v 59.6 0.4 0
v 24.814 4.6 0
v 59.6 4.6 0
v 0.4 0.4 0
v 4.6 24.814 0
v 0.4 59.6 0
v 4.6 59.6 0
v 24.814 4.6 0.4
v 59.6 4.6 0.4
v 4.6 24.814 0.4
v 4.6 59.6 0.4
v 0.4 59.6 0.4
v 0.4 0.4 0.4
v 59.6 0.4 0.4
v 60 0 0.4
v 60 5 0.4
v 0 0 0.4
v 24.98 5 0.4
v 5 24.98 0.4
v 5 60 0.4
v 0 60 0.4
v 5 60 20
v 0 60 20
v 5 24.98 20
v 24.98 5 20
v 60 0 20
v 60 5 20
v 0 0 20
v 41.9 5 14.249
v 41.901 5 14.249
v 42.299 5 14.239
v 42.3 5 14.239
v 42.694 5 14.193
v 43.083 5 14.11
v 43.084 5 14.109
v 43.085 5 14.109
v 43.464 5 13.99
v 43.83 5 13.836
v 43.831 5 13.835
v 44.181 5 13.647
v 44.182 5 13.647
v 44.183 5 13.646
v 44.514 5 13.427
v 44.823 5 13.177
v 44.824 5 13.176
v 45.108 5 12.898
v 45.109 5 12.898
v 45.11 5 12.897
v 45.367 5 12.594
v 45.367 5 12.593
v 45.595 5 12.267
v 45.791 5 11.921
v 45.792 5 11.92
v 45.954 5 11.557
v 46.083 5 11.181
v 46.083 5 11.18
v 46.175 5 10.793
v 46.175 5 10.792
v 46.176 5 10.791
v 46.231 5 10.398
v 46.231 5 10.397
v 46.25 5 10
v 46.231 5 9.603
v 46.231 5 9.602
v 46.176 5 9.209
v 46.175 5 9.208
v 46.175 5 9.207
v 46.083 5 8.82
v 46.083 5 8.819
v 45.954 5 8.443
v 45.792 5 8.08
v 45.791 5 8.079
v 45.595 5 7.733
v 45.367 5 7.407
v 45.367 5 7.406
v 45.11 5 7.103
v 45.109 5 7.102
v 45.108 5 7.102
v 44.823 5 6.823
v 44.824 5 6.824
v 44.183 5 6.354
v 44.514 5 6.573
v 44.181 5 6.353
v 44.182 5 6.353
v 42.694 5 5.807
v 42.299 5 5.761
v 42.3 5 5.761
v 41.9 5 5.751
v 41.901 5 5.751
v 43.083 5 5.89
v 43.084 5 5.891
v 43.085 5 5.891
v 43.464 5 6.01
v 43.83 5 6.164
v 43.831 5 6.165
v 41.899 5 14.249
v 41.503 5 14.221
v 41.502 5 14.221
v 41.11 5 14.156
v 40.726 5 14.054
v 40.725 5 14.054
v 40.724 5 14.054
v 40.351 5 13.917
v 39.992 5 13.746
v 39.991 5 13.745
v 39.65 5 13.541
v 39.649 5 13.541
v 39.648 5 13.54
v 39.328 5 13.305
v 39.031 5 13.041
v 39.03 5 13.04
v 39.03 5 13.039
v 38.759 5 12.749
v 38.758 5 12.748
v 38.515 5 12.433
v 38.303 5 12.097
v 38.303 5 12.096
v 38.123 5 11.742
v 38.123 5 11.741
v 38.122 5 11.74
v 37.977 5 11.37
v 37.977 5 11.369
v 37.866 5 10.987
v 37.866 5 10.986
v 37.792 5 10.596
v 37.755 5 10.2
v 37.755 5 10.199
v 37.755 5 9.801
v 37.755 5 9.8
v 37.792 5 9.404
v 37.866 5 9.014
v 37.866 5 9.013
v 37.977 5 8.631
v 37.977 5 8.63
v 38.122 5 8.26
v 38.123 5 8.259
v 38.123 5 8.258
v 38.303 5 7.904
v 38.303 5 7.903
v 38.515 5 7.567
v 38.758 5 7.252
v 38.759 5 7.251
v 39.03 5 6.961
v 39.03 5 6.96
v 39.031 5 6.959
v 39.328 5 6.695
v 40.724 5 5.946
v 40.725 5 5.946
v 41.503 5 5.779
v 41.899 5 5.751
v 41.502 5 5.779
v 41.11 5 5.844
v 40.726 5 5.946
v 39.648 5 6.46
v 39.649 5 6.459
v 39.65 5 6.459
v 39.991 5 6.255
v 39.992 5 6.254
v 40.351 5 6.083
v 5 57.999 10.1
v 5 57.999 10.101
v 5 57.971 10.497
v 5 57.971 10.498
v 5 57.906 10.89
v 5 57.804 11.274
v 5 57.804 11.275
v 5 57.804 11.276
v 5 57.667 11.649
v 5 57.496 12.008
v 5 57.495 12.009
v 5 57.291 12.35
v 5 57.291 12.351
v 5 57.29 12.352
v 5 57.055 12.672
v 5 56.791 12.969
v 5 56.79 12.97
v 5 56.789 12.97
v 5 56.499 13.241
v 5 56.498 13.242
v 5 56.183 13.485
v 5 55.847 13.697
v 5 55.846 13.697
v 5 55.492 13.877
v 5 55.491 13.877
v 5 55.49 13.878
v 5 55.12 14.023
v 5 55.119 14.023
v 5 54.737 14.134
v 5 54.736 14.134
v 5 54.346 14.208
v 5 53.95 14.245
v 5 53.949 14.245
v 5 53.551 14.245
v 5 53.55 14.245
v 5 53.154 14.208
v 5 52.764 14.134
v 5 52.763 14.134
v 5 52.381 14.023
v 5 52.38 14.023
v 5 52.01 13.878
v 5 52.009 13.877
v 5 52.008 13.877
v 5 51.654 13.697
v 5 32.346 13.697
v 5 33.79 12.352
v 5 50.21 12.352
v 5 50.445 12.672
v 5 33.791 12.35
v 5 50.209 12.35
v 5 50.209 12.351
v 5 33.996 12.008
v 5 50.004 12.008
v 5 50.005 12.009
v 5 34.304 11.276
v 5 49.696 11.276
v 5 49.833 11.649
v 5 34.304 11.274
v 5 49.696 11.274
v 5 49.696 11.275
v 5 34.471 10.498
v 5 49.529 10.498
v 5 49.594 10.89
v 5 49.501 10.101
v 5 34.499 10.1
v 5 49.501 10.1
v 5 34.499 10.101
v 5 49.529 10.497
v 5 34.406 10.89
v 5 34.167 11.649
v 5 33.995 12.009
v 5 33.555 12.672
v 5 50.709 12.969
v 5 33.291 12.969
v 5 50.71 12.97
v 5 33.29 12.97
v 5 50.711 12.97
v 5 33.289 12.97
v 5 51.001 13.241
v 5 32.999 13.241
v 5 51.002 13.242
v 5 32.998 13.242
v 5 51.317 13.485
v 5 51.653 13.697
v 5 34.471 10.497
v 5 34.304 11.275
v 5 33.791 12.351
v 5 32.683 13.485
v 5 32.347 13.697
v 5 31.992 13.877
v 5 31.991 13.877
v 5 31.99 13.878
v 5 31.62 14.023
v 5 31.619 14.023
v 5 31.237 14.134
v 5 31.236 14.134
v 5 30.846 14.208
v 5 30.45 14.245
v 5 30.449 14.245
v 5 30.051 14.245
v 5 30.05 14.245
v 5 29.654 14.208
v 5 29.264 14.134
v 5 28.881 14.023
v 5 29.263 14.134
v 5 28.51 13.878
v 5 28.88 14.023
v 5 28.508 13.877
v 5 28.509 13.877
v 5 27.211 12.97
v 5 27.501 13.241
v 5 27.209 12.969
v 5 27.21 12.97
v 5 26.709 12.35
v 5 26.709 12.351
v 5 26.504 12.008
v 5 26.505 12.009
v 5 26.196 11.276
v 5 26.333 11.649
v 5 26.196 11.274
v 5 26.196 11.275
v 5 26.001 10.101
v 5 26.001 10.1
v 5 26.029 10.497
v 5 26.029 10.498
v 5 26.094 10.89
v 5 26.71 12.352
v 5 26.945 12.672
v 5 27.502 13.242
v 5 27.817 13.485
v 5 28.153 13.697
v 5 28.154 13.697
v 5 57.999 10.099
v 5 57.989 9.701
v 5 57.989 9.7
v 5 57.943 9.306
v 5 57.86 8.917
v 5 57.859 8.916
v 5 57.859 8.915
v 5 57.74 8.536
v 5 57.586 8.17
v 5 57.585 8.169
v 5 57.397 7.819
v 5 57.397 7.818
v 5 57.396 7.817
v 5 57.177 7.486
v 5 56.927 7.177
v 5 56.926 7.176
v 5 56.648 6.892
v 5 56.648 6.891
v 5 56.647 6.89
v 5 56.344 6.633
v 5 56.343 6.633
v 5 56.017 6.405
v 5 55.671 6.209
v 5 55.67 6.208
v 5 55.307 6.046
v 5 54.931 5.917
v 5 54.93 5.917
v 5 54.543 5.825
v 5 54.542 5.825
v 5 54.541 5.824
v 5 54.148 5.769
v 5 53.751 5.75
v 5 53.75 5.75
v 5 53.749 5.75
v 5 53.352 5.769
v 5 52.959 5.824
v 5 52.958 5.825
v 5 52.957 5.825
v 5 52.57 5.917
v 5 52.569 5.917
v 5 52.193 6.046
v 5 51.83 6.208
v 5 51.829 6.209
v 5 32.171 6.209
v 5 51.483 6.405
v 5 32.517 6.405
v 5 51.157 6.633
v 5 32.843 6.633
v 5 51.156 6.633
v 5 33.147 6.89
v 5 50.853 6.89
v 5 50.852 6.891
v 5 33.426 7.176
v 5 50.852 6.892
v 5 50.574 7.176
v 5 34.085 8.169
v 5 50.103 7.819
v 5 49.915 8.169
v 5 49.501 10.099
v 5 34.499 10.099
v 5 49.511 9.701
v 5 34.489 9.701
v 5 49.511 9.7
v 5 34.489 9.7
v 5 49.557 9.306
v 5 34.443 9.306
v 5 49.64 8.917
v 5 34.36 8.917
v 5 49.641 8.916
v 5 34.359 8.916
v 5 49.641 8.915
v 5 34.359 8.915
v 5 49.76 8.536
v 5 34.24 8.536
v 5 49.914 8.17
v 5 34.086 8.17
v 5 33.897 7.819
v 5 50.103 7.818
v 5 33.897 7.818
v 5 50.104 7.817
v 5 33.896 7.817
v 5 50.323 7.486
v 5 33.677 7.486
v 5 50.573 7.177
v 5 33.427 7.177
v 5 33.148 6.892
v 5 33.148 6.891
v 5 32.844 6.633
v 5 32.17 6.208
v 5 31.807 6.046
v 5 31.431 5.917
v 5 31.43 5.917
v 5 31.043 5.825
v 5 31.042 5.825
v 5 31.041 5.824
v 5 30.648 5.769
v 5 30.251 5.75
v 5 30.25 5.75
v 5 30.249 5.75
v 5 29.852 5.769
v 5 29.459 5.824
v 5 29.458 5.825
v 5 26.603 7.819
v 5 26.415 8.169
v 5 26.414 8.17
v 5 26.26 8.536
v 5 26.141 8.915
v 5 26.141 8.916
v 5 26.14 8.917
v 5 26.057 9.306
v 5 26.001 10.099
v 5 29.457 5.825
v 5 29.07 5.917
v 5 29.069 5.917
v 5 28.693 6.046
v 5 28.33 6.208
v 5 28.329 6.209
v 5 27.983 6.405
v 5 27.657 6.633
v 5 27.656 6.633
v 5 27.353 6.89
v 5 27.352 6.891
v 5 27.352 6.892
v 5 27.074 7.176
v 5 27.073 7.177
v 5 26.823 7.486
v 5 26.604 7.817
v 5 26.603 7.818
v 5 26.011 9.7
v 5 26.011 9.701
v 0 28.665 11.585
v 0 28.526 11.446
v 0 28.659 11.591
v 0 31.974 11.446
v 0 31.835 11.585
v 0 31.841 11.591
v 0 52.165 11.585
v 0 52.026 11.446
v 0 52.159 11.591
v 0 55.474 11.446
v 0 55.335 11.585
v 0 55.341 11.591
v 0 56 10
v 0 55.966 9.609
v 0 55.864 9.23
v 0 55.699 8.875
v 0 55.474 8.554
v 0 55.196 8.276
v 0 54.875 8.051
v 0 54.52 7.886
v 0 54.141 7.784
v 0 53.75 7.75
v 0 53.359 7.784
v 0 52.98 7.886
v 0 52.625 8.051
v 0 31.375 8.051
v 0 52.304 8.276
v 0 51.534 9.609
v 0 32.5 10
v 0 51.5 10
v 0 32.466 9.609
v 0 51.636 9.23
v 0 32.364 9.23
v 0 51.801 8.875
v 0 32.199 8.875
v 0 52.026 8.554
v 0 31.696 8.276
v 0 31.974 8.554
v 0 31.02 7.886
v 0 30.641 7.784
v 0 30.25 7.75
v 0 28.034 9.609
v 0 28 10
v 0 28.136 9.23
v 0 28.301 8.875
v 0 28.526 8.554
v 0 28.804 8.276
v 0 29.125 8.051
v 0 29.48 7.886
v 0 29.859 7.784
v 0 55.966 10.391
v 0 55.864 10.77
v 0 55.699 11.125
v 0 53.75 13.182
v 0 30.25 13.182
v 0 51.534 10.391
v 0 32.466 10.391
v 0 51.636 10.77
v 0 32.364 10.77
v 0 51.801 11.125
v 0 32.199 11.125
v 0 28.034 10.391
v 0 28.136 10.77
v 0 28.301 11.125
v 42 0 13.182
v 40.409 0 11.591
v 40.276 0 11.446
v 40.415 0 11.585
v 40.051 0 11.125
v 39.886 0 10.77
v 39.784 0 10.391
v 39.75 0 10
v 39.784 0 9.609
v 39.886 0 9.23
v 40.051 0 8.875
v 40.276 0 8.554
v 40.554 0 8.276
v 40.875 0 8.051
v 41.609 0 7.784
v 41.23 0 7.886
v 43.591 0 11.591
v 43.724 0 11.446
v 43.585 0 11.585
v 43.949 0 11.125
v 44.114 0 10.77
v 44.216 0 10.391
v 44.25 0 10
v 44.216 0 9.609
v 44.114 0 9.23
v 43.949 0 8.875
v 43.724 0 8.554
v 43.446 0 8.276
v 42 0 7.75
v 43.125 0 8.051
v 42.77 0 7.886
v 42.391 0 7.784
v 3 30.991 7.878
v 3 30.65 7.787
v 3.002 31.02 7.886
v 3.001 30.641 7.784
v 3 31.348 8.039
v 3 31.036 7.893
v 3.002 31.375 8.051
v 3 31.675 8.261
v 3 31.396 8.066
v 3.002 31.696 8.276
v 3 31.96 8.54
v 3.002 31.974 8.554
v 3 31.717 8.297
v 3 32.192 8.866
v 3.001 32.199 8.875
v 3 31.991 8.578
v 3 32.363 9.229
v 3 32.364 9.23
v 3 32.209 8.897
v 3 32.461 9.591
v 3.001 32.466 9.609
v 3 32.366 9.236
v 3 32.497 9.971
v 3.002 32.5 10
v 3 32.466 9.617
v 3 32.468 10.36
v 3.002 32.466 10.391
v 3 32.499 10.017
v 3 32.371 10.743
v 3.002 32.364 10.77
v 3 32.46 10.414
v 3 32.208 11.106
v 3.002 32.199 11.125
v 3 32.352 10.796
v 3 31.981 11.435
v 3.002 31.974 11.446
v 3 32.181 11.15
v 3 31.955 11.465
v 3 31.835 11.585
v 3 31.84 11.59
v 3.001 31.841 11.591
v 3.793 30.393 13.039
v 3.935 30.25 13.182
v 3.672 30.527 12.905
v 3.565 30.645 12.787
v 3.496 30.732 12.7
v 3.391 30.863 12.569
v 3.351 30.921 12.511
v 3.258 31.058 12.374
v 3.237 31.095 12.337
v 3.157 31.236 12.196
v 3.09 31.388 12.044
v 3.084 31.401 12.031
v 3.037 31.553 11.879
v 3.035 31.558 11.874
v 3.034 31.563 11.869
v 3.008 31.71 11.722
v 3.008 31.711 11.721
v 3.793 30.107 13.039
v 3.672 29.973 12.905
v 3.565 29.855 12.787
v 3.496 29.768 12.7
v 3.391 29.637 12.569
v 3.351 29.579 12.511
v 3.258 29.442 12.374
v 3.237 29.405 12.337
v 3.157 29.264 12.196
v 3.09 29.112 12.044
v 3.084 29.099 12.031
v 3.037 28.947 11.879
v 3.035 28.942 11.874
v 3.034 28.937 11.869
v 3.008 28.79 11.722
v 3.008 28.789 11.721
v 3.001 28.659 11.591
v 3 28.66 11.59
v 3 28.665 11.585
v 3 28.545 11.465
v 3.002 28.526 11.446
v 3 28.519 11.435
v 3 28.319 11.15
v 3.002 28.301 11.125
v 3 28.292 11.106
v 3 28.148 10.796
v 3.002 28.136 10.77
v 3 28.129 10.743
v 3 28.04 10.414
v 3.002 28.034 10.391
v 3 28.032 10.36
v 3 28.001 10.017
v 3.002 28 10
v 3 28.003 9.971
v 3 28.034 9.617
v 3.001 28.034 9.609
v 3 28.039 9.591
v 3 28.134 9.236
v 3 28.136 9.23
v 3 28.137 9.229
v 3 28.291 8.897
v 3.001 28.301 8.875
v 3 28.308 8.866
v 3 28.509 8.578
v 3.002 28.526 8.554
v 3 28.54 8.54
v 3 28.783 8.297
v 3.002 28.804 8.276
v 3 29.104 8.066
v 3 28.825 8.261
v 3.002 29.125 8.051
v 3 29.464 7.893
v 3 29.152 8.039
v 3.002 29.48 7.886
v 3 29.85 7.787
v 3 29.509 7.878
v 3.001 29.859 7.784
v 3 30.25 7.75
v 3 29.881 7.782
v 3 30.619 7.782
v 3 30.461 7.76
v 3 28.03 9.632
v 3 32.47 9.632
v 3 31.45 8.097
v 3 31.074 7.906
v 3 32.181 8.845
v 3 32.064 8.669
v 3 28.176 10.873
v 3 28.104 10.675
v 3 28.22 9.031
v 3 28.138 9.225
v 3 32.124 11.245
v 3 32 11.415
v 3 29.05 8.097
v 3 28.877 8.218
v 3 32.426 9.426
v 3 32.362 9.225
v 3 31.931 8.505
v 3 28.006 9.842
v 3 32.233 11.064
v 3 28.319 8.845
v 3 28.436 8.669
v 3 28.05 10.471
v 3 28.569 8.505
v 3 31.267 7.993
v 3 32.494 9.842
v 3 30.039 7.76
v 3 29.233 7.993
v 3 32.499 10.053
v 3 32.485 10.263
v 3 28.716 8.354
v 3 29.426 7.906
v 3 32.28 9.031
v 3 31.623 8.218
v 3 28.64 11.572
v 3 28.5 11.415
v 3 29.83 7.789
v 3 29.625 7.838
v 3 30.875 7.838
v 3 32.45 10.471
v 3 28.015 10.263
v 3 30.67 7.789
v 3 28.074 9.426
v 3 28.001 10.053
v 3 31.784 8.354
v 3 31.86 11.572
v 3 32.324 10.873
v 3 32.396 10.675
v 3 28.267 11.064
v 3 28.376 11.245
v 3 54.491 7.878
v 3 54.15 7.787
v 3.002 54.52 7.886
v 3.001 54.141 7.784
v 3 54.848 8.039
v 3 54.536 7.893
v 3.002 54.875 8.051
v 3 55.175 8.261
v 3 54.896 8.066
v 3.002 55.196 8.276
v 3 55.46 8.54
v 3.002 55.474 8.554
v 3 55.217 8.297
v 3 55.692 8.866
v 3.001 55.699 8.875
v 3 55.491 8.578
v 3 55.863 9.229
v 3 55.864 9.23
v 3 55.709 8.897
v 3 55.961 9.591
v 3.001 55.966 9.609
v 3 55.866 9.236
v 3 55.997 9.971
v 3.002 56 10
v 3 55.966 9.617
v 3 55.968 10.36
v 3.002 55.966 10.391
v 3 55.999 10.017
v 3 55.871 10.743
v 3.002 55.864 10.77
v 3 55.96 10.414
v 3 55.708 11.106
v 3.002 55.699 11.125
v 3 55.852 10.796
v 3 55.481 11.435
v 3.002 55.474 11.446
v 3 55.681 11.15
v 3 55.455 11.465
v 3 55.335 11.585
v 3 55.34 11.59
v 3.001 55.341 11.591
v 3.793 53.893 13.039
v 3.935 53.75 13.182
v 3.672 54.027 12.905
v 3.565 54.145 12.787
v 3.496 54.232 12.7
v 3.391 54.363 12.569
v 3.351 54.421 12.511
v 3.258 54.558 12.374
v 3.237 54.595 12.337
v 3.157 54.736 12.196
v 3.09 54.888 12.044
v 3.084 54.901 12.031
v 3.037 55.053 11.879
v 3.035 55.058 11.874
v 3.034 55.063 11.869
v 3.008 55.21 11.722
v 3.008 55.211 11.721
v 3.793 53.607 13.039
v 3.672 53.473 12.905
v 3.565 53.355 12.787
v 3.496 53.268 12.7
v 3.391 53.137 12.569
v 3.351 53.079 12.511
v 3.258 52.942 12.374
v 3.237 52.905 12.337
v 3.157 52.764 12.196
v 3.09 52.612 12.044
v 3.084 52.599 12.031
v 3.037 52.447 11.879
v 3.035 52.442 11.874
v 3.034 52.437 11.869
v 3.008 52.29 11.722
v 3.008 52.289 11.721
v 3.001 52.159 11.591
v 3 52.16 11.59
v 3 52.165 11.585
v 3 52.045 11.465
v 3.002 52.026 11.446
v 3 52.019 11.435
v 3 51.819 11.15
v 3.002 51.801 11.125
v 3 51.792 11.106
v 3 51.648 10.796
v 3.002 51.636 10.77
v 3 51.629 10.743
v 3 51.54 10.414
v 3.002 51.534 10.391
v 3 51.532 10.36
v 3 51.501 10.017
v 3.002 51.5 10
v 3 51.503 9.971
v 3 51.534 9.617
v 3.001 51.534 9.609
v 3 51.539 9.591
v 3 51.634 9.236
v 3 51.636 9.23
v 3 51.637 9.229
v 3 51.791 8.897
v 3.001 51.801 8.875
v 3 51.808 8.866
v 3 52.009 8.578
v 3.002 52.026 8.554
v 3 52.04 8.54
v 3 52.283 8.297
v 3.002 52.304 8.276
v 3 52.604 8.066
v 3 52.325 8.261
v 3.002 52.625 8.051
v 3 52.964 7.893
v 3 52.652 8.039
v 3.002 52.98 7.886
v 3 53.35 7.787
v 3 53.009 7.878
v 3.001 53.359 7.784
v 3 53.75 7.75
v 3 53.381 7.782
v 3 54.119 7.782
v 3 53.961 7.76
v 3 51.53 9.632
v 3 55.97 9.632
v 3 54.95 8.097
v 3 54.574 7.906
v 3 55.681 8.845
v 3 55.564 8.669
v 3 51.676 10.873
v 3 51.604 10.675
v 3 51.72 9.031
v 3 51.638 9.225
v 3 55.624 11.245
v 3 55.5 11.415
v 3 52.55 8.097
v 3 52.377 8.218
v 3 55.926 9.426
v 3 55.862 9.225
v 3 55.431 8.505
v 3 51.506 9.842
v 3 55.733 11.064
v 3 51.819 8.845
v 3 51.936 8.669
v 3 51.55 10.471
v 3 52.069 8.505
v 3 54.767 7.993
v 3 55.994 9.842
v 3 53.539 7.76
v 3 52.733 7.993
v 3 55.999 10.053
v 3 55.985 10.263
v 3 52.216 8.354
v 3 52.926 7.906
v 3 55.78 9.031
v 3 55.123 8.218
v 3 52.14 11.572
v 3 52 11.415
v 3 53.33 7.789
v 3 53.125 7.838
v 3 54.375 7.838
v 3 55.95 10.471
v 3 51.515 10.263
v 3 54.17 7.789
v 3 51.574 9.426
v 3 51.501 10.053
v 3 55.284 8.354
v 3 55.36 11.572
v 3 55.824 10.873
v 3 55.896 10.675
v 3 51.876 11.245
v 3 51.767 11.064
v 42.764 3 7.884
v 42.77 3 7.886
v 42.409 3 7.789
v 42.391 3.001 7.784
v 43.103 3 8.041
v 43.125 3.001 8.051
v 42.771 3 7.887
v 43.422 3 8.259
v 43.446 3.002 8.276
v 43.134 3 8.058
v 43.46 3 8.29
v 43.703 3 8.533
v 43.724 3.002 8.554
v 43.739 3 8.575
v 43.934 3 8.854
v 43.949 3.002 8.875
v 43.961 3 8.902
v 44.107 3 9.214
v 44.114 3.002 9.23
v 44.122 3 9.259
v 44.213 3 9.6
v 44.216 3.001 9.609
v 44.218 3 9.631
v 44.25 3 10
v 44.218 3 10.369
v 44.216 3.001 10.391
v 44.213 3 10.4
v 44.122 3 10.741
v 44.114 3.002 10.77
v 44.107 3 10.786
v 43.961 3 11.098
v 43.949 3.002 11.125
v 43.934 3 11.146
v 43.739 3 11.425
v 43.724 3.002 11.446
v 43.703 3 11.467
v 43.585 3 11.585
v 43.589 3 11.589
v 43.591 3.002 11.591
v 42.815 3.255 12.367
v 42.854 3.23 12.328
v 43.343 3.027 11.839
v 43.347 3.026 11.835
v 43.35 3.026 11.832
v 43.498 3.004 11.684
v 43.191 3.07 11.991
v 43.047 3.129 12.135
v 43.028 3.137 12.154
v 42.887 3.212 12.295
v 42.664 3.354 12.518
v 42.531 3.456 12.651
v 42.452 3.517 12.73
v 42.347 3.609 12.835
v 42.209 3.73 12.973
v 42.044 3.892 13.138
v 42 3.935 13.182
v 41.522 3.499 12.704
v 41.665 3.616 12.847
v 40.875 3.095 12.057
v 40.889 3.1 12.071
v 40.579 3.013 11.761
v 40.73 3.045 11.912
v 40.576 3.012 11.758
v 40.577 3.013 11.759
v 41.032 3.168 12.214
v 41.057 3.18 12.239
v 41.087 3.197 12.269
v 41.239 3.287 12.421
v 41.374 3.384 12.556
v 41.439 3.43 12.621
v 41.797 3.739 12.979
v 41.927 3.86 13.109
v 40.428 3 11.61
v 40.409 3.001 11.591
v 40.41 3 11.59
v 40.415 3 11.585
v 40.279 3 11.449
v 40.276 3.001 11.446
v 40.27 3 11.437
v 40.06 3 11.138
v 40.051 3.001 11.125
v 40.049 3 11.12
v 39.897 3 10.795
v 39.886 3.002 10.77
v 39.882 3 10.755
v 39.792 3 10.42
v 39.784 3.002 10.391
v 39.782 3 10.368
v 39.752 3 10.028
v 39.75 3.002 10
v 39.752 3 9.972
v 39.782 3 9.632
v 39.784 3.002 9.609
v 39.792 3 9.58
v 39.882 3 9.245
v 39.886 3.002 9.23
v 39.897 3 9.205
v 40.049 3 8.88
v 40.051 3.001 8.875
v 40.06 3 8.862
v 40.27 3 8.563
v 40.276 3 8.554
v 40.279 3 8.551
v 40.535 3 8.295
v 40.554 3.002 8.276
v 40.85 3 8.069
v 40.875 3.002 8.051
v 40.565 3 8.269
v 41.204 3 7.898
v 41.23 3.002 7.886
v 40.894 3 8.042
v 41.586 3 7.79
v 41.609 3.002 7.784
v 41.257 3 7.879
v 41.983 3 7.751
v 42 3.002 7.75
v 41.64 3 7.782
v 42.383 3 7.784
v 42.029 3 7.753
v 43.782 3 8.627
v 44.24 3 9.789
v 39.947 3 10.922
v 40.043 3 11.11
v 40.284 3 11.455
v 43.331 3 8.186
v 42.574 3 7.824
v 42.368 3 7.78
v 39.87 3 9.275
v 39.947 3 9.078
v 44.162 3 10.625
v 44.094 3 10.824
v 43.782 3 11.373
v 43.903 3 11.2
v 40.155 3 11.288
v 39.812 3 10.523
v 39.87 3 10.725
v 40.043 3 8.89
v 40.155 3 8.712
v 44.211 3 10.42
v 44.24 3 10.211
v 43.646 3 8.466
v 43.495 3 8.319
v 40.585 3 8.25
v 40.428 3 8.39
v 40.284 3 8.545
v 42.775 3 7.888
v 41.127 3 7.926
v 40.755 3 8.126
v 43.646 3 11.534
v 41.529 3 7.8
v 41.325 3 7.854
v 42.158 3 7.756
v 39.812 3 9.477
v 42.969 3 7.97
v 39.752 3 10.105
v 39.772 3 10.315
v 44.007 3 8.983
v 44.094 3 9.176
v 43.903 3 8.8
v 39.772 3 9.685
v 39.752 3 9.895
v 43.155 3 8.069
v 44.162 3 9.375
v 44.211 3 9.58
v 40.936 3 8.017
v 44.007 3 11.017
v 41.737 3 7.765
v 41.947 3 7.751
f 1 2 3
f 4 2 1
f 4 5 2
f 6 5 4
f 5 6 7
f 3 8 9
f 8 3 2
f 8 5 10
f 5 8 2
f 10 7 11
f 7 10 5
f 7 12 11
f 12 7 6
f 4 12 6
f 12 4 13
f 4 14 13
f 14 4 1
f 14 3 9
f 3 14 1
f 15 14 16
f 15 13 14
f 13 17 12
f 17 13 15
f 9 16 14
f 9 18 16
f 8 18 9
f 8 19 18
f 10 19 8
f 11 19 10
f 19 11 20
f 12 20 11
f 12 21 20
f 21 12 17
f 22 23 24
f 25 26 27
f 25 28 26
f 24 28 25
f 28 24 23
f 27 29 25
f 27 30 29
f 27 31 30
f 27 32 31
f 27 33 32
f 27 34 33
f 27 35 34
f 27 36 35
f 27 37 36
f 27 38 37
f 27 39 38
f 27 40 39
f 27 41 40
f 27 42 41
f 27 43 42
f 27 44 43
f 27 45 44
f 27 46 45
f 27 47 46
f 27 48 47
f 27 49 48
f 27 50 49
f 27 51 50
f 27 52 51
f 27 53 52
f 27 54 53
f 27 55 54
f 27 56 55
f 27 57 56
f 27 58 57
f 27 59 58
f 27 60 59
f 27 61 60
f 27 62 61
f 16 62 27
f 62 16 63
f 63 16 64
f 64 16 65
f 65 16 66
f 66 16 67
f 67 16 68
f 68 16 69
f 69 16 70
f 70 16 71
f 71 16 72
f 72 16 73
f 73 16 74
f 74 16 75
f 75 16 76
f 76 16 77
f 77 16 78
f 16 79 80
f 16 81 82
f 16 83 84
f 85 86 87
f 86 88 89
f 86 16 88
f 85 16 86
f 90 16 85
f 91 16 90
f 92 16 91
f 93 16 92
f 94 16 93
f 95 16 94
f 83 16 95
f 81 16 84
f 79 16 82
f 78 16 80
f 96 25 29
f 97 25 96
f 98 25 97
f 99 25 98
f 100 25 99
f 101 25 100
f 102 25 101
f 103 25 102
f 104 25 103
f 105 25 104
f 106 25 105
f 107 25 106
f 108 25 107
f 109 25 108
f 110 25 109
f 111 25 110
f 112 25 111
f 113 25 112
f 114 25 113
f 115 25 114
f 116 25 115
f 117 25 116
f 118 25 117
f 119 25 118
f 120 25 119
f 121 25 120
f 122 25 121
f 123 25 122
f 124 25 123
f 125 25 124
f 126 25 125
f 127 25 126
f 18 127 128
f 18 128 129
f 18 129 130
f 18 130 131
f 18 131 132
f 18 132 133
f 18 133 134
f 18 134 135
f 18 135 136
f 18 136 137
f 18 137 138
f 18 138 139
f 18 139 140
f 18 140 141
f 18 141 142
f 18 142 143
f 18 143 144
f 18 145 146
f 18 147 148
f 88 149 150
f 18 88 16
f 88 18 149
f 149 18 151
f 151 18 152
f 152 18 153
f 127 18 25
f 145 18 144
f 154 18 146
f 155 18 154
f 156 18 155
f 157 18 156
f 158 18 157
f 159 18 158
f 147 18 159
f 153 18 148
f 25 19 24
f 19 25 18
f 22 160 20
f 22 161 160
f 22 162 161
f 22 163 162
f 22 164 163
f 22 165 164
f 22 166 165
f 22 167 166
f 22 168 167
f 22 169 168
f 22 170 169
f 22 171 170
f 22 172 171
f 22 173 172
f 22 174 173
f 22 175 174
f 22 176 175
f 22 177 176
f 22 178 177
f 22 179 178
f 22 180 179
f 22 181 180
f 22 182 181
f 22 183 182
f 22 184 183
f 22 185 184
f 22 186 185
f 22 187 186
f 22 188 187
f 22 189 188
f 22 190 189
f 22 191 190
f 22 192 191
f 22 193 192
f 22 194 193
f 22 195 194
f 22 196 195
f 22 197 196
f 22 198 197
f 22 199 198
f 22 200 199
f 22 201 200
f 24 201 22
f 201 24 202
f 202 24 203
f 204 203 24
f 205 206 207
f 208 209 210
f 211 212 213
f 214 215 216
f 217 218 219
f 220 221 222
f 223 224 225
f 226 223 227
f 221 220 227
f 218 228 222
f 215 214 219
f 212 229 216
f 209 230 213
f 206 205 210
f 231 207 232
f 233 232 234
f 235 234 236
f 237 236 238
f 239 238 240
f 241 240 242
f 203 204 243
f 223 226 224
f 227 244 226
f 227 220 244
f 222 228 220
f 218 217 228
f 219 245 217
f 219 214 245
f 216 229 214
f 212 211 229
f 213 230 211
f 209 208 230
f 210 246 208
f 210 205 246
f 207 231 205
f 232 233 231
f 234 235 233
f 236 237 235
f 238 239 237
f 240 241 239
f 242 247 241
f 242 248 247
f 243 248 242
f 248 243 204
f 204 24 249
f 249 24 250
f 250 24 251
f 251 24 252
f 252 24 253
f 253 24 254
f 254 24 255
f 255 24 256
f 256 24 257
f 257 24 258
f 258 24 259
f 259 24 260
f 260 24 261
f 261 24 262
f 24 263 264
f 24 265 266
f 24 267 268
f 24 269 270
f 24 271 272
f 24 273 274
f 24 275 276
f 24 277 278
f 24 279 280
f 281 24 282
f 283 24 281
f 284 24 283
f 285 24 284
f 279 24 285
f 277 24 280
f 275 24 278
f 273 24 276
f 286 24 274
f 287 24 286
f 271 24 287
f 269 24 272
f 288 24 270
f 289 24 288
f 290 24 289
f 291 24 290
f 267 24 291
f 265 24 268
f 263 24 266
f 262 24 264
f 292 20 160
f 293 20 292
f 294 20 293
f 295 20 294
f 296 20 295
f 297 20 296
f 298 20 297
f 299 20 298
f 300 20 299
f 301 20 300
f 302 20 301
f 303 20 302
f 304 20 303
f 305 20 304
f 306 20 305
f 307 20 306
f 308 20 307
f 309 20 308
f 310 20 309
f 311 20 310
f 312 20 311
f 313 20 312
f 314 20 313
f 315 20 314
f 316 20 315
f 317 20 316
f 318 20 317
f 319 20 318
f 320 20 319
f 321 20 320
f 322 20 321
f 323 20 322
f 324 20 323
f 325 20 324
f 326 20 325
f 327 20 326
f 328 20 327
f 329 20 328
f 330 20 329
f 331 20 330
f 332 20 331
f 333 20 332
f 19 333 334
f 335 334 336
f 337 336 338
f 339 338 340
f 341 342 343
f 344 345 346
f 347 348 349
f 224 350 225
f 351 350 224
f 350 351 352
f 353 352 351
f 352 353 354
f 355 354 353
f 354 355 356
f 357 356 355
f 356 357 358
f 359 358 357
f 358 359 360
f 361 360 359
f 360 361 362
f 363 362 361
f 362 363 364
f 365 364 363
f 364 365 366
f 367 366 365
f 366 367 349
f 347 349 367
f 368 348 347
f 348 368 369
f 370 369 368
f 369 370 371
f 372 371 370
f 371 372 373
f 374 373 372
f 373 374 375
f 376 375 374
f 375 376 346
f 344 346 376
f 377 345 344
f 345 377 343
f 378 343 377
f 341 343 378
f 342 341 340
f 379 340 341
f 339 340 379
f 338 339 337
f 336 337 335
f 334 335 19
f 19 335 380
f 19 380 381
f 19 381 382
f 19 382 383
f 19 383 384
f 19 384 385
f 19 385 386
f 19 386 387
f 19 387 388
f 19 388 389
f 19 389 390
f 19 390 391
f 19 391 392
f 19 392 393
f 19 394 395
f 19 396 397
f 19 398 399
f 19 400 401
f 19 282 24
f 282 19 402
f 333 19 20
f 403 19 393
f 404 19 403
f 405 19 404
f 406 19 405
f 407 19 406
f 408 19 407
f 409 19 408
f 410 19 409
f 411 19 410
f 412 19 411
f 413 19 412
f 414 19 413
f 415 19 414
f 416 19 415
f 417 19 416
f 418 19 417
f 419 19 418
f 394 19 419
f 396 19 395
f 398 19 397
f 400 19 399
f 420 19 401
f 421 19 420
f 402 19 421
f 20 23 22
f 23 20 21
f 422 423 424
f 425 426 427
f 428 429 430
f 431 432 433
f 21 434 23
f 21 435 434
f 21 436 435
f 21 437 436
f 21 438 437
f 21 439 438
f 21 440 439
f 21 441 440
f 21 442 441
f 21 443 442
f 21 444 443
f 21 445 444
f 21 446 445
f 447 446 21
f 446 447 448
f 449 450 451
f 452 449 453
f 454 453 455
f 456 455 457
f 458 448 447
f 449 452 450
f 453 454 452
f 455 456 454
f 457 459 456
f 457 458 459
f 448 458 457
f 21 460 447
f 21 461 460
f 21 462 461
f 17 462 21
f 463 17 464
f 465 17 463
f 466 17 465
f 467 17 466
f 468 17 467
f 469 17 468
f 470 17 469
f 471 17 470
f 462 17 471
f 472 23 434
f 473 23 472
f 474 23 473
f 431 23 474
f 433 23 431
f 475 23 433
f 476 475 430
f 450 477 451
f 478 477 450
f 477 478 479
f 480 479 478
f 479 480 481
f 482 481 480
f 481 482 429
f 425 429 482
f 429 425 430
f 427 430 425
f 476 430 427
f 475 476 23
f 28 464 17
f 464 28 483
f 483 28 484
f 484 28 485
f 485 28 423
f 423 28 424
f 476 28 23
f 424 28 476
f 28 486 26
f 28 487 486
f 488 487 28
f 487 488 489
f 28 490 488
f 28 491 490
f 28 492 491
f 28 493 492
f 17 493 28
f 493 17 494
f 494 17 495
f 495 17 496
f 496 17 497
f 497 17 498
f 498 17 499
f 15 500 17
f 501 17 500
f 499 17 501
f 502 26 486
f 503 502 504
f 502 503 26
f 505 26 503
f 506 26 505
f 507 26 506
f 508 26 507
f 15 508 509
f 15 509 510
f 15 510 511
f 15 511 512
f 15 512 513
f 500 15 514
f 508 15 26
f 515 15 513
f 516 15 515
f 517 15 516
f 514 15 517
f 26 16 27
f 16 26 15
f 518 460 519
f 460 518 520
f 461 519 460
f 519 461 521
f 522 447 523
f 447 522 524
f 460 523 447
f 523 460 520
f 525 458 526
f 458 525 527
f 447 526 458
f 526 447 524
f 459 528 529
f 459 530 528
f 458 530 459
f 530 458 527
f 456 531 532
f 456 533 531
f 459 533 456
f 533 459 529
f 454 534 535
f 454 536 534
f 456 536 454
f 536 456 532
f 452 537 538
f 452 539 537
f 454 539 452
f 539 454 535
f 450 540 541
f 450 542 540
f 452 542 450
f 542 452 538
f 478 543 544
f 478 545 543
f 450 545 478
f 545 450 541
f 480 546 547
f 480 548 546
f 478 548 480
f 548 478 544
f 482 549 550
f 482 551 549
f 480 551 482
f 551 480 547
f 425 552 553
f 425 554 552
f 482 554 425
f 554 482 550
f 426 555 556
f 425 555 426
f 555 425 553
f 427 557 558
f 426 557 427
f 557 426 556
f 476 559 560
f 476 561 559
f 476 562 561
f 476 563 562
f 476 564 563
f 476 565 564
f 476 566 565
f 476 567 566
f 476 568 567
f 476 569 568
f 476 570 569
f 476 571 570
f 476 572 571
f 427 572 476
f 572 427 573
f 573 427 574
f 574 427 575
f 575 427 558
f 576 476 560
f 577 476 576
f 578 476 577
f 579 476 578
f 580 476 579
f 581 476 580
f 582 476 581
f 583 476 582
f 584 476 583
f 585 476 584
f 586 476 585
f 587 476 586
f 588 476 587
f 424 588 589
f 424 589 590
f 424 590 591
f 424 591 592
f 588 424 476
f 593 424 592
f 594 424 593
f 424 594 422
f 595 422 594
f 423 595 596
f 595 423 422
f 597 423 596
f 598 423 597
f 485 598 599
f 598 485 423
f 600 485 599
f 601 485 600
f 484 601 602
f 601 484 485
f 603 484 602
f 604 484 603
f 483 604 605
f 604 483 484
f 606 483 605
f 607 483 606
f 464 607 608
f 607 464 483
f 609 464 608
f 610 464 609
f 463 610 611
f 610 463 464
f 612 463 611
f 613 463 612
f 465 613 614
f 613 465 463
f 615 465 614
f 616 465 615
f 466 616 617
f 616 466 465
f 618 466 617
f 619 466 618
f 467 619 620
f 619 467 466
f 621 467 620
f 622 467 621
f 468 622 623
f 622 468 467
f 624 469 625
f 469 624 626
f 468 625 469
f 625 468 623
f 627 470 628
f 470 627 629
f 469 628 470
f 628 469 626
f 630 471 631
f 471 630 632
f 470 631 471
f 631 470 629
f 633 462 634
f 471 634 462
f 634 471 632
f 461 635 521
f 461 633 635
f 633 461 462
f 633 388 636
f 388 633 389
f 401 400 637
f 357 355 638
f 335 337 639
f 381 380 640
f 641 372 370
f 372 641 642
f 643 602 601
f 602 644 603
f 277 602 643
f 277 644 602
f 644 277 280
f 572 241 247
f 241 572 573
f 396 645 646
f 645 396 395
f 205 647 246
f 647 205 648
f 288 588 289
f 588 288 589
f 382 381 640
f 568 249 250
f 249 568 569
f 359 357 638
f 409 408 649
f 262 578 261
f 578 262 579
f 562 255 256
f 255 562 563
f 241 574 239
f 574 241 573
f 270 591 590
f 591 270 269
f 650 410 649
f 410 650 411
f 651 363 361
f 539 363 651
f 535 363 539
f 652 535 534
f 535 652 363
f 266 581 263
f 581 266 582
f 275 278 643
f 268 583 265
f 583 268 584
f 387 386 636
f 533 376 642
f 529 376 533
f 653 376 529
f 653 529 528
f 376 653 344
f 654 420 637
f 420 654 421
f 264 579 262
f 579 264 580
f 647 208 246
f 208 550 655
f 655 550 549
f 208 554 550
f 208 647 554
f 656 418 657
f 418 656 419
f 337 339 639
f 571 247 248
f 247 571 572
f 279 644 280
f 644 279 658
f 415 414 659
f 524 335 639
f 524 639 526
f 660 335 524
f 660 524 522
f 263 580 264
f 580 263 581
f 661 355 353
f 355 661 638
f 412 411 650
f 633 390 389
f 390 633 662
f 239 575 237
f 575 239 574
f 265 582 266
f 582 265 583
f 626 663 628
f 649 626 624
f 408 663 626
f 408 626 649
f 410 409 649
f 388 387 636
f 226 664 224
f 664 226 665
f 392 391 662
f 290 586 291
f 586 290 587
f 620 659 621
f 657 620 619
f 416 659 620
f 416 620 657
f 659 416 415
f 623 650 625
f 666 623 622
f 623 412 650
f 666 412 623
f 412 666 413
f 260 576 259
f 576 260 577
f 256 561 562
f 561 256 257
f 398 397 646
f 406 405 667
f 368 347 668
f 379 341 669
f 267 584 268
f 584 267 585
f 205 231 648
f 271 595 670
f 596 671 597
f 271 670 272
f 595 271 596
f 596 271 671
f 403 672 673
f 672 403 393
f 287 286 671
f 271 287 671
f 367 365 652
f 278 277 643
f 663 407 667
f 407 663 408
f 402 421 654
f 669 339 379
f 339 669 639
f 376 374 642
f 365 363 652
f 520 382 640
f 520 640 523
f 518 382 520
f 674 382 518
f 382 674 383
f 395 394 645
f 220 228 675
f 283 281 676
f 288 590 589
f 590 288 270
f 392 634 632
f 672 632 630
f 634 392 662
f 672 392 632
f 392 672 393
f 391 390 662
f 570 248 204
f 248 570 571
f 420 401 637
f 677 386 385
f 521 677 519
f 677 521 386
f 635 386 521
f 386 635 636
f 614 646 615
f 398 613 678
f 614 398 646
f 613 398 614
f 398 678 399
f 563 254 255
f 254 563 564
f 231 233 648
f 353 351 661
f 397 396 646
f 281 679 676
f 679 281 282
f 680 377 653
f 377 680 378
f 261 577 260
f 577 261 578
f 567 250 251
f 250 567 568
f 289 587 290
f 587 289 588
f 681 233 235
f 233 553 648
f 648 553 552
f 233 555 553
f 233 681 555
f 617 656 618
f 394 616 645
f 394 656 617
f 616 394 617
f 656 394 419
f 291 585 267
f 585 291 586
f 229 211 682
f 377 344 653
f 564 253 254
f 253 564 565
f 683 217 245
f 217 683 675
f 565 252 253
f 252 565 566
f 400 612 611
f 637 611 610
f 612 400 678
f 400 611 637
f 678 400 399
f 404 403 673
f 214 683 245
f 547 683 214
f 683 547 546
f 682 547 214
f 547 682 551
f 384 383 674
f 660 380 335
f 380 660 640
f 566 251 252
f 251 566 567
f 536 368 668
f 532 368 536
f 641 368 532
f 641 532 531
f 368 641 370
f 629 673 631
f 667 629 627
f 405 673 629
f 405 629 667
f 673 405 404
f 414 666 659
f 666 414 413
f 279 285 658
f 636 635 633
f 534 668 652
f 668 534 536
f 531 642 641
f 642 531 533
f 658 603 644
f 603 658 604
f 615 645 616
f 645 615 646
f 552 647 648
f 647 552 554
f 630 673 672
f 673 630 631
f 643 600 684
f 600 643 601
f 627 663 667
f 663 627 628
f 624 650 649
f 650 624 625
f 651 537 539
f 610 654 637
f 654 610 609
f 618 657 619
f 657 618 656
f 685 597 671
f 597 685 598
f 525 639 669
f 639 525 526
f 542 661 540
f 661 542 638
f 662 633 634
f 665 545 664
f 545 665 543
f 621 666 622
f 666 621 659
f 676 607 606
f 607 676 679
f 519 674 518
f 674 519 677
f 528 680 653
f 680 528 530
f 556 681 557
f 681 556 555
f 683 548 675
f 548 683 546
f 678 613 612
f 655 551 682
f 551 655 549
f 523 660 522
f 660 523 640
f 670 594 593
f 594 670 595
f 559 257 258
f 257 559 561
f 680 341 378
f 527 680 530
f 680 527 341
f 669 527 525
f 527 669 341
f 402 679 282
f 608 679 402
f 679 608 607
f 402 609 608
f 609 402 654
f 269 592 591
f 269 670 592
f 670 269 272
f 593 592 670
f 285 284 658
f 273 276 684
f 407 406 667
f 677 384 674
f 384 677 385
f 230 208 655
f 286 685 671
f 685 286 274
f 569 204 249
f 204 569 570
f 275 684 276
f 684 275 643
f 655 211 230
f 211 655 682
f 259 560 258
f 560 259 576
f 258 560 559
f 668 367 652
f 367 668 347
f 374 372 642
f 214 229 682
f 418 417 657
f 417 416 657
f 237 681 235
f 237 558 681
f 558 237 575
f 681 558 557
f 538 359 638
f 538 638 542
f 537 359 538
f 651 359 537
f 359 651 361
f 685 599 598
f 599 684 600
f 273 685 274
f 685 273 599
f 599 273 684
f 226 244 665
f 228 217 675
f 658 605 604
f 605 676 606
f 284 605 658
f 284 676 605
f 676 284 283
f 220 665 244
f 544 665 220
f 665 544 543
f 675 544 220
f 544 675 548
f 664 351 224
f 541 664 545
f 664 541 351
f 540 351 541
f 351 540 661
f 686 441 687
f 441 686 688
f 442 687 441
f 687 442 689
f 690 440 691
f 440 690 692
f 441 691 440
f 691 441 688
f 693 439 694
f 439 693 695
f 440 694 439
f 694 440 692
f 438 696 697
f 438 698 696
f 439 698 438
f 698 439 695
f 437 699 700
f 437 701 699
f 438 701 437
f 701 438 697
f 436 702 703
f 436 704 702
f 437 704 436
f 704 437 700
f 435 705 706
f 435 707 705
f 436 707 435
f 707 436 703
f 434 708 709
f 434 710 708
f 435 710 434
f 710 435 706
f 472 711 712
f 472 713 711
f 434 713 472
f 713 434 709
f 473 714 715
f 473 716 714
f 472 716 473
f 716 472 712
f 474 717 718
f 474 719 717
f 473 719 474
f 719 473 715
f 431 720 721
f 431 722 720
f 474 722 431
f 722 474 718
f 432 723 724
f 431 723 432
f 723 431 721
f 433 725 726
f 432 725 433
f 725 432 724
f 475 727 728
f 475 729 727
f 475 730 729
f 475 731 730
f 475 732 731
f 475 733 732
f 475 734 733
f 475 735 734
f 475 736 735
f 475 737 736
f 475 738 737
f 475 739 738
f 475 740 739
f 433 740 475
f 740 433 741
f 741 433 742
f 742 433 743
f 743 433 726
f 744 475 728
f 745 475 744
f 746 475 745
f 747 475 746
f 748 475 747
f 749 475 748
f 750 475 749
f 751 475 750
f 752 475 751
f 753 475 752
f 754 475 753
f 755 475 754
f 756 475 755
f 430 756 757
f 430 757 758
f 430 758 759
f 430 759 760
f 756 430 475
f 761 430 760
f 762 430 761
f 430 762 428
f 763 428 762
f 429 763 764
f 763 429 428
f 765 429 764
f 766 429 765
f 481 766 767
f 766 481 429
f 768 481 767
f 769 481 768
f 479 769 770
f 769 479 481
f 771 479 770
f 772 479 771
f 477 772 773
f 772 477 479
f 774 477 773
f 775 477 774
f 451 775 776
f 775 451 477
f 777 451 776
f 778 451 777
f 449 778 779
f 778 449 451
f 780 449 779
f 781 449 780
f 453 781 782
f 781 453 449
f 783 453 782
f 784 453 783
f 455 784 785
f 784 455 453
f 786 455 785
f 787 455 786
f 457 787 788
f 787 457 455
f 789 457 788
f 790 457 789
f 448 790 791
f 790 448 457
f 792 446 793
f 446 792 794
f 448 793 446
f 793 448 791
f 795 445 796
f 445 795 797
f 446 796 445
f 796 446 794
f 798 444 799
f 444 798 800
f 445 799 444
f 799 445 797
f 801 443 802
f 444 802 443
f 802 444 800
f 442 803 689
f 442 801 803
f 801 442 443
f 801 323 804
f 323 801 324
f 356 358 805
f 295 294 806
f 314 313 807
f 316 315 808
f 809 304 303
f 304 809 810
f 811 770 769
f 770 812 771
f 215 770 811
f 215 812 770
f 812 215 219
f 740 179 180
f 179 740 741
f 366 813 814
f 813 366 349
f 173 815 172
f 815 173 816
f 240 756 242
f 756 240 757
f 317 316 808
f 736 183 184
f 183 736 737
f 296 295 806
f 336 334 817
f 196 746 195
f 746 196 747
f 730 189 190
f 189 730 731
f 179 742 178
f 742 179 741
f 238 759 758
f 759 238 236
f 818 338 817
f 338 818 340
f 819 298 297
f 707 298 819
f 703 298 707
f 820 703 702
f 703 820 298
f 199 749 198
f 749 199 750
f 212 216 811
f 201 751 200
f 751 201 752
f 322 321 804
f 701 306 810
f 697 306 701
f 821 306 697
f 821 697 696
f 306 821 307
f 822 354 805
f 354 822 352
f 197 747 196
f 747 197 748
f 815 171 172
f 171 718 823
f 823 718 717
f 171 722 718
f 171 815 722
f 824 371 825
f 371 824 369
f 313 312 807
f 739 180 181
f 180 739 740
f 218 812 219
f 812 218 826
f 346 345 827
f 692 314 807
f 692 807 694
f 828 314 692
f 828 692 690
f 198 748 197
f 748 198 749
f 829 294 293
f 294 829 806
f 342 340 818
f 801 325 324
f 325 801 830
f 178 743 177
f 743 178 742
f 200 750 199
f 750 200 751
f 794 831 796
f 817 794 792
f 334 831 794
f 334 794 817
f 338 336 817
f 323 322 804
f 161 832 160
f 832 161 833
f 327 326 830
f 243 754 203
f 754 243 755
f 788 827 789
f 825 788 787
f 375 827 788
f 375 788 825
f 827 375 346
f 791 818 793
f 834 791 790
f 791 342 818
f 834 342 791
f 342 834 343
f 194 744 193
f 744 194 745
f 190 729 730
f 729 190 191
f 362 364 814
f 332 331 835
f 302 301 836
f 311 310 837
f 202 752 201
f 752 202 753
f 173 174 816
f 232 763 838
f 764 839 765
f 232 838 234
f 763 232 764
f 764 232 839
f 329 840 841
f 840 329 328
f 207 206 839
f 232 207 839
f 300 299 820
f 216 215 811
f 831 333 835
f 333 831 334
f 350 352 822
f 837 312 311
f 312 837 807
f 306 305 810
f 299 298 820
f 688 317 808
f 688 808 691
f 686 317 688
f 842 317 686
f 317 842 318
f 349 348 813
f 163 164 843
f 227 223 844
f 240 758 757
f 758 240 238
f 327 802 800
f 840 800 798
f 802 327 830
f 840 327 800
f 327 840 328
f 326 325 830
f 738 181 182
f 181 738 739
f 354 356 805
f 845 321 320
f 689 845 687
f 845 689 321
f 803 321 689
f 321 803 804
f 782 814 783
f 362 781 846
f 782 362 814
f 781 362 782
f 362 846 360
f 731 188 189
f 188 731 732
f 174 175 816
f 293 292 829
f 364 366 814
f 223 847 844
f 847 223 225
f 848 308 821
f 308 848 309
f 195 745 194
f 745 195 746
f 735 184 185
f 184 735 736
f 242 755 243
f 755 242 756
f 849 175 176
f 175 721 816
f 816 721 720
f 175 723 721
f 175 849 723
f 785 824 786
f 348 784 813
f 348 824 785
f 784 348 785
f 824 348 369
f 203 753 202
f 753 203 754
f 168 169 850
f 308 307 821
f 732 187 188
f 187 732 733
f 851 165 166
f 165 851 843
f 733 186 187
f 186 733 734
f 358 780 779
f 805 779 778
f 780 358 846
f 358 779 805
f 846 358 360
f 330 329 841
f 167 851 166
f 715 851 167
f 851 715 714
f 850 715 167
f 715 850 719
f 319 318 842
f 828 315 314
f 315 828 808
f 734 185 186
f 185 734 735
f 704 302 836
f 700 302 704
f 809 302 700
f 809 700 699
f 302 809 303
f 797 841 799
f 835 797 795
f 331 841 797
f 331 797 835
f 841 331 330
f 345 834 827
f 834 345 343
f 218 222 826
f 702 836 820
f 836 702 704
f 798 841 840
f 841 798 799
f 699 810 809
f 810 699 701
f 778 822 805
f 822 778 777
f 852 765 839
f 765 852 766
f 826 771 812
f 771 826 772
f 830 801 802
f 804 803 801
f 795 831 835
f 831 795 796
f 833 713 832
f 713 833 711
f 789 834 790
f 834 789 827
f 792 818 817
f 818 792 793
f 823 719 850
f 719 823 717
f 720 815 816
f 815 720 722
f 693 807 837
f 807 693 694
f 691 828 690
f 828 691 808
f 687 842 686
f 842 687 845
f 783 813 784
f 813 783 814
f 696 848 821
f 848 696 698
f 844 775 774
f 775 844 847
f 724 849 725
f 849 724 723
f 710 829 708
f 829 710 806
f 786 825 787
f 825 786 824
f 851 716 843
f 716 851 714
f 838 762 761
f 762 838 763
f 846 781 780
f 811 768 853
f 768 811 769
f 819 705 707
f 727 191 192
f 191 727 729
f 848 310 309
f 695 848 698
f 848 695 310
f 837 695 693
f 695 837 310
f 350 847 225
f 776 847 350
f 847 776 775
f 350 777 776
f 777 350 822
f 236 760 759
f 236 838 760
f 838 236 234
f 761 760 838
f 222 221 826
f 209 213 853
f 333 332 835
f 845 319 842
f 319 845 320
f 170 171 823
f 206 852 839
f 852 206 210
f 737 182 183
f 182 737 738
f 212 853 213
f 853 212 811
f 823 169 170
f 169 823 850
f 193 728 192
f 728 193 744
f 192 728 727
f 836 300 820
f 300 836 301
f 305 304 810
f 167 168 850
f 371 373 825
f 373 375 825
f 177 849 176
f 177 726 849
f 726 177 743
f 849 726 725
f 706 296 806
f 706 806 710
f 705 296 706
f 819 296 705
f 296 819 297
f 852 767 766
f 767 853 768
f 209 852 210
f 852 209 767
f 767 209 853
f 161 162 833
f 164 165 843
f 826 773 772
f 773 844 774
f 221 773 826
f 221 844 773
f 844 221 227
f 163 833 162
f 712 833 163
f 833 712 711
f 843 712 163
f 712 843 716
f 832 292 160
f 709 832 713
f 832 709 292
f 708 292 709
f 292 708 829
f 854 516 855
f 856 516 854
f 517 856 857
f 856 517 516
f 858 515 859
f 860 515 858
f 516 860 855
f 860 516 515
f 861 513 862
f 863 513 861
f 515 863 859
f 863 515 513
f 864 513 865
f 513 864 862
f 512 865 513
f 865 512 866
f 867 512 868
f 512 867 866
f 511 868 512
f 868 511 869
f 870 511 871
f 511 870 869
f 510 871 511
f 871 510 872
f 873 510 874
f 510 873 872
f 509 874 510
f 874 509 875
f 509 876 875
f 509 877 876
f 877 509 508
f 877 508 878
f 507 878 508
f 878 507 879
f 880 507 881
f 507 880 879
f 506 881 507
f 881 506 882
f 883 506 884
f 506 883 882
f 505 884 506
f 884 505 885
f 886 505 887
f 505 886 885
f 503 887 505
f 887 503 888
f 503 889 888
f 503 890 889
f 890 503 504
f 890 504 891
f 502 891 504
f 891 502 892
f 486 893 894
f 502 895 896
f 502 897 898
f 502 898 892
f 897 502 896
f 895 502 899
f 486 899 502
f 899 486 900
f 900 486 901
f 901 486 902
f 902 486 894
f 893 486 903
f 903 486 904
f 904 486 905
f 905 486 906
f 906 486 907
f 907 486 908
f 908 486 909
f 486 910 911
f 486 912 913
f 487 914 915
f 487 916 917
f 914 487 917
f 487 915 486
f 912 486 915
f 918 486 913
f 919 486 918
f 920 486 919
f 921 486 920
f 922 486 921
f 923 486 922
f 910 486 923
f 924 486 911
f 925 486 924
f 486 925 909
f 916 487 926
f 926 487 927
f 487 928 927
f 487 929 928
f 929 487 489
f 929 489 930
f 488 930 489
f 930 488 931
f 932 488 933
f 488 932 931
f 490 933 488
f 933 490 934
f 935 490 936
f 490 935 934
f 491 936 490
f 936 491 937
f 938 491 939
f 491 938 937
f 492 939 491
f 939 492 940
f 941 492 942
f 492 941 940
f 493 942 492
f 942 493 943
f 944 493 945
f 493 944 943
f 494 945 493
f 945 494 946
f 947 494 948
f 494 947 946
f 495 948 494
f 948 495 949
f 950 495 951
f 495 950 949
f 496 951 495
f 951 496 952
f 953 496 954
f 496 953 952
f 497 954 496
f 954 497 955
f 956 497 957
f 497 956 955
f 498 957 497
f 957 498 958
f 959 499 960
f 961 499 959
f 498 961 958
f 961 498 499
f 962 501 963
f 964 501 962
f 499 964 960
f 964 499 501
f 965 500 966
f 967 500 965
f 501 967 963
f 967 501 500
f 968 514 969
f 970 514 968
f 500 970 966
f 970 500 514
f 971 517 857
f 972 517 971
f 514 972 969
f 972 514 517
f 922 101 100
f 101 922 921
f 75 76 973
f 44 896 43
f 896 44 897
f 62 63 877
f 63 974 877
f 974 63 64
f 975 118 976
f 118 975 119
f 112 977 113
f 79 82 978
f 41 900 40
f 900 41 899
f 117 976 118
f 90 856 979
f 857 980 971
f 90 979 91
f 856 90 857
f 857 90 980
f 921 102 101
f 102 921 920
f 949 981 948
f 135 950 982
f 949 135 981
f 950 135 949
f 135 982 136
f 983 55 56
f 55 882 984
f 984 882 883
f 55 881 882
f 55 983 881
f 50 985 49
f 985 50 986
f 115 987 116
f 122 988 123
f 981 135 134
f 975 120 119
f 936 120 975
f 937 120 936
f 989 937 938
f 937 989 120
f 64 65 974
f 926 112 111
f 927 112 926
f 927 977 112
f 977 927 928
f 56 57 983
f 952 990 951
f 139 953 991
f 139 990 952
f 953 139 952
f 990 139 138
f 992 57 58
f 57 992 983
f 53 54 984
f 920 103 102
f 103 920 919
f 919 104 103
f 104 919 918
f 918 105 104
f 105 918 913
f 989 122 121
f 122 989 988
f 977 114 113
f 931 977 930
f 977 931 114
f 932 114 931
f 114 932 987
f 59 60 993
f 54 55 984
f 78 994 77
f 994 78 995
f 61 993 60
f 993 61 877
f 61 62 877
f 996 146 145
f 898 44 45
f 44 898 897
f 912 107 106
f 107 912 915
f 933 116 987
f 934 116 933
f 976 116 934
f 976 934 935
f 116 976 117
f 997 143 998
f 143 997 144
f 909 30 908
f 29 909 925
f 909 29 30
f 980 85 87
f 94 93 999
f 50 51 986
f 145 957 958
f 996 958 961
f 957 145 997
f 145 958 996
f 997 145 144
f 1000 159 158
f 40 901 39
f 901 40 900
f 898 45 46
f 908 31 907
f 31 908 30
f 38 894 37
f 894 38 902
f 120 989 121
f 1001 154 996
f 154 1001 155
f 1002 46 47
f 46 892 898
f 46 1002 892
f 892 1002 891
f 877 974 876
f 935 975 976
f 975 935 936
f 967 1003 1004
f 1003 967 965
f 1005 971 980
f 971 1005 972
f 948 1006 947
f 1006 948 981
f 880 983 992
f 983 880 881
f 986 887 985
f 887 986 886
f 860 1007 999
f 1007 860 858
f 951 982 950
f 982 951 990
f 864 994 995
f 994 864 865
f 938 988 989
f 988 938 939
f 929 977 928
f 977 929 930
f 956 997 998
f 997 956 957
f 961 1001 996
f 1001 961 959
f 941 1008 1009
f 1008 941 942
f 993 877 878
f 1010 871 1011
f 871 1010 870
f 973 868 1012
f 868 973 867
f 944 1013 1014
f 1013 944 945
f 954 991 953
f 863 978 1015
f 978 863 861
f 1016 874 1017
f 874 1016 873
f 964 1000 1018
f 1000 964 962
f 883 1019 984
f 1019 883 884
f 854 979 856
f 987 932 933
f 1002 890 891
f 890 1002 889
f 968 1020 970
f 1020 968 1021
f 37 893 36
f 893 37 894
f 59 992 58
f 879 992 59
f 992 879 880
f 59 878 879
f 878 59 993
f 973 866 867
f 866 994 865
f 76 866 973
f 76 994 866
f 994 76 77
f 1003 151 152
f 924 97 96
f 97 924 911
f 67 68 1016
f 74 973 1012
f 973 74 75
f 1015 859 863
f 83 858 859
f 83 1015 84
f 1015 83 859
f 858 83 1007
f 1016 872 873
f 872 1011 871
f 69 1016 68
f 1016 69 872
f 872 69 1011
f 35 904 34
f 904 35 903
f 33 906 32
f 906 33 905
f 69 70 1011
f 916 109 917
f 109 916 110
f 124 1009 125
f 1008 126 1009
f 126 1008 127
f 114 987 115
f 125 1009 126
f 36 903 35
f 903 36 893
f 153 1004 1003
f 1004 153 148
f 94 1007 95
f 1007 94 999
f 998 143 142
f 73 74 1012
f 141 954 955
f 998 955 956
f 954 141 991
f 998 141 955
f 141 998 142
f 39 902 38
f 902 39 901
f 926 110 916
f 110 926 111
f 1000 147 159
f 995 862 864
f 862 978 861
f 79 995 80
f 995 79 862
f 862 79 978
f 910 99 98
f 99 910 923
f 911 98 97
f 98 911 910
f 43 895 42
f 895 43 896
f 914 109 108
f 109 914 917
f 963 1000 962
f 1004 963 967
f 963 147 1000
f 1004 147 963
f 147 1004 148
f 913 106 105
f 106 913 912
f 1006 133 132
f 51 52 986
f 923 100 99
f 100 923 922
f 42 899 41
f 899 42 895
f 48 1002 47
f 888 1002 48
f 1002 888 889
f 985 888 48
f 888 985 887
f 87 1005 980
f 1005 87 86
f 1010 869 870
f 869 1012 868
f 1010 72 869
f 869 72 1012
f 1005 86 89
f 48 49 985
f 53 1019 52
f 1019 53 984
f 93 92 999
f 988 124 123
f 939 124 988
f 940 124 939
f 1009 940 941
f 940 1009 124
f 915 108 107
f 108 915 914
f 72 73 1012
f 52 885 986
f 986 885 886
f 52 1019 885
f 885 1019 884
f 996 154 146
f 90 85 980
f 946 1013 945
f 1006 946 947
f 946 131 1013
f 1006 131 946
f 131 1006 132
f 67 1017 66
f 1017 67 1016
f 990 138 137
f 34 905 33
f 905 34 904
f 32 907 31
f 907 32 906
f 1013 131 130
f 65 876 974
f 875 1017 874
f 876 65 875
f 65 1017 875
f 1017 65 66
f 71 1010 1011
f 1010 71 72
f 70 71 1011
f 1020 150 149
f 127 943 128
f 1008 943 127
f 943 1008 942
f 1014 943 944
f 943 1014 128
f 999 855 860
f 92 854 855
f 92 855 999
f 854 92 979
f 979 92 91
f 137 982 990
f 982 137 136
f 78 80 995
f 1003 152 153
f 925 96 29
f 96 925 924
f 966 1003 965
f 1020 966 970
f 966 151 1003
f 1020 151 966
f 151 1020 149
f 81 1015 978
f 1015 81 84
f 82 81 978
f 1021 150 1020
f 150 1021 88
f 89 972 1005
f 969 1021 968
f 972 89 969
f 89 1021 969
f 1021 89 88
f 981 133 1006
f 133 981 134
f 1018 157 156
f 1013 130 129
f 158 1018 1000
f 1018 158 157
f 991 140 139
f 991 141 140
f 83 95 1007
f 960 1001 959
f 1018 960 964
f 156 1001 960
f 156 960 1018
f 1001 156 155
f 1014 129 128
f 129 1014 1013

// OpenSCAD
// @checkpoint parent= desc="Escuadra de pared en L con refuerzo y agujeros avellanados (plantilla)"
// Plantilla ScadLab: escuadra en L para estantes o soportes de pared.
// Se imprime ACOSTADA (el perfil en L apoyado en la placa): así las capas
// siguen la L y la esquina no se parte. Los agujeros quedan horizontales y
// por eso tienen forma de lágrima.

/* [Dimensiones] */
arm_len = 60;        // [20:1:170]
plate_h = 60;        // [20:1:170]
width = 20;          // [8:1:60]
thickness = 5;       // [2:0.5:12]
// Cateto del refuerzo triangular (0 = sin refuerzo)
gusset = 20;         // [0:1:80]

/* [Tornillos] */
screw_d = 4.5;       // [2.5:0.1:8]
head_d = 8.5;        // [5:0.5:16]
countersink = true;
wall_holes = 2;      // [0:1:4]
arm_holes = 1;       // [0:1:4]

/* [Acabado] */
// Recorte de la primera capa contra la pata de elefante
foot_inset = 0.4;    // [0:0.1:1]

/* [Colores] */
part_color = "#607D8B";

/* [Hidden] */
PLATE = [180, 180, 180];   // A1 mini; ajustar según printer.json
eps = 0.01;
$fa = $preview ? 12 : 4;
$fs = $preview ? 2 : 0.4;

cs_h = (head_d - screw_d) / 2;                // avellanado a 90°
wall_lo = thickness + gusset + head_d / 2 + 1;
wall_hi = plate_h - head_d / 2 - 2;
arm_lo = thickness + gusset + head_d / 2 + 1;
arm_hi = arm_len - head_d / 2 - 2;

assert(width >= head_d + 2, "width debe dejar al menos 1 mm a cada lado de la cabeza");
assert(wall_holes == 0 || wall_hi >= wall_lo, "plate_h muy corto para los agujeros de pared con este gusset");
assert(arm_holes == 0 || arm_hi >= arm_lo, "arm_len muy corto para los agujeros del brazo con este gusset");
assert(!countersink || cs_h < thickness - 0.8, "thickness muy fino para avellanar");
assert(arm_len <= PLATE.x - 4 && plate_h <= PLATE.y - 4 && width <= PLATE.z, str("No cabe en la placa ", PLATE));

// ---------- Ensamblado ----------
color(part_color) bracket();

// ---------- Módulos ----------
function spread(lo, hi, n) = n <= 1 ? [(lo + hi) / 2] : [for (i = [0 : n - 1]) lo + i * (hi - lo) / (n - 1)];

module profile_2d() {
    union() {
        square([arm_len, thickness]);                 // brazo (eje X)
        square([thickness, plate_h]);                 // placa de pared (eje Y)
        if (gusset > 0)
            translate([thickness - eps, thickness - eps])
                polygon([[0, 0], [gusset, 0], [0, gusset]]);
    }
}

// Extruye el perfil con la primera capa recortada (compensa la pata de elefante)
module foot_compensated_extrude(h, c) {
    if (c > 0) linear_extrude(height = c + eps) offset(delta = -c) children();
    translate([0, 0, c]) linear_extrude(height = h - c) children();
}

module teardrop_2d(r) {
    union() {
        circle(r = r);
        rotate(45) square(r);
    }
}

// Agujero horizontal a lo largo de Y con la punta hacia +Z
module teardrop_hole(d, length) {
    rotate([90, 0, 0]) linear_extrude(height = length, center = true) teardrop_2d(d / 2);
}

module bracket() {
    difference() {
        foot_compensated_extrude(width, foot_inset) profile_2d();
        // agujeros de la placa de pared (eje X), cabeza del lado interno
        if (wall_holes > 0)
            for (y = spread(wall_lo, wall_hi, wall_holes)) {
                translate([thickness / 2, y, width / 2])
                    rotate([0, 0, 90]) teardrop_hole(screw_d, thickness + 2);
                if (countersink)
                    translate([thickness - cs_h, y, width / 2])
                        rotate([0, 90, 0]) cylinder(h = cs_h + eps, d1 = screw_d, d2 = head_d + 2 * eps);
            }
        // agujeros del brazo (eje Y), cabeza del lado interno
        if (arm_holes > 0)
            for (x = spread(arm_lo, arm_hi, arm_holes)) {
                translate([x, thickness / 2, width / 2])
                    teardrop_hole(screw_d, thickness + 2);
                if (countersink)
                    translate([x, thickness - cs_h, width / 2])
                        rotate([-90, 0, 0]) cylinder(h = cs_h + eps, d1 = screw_d, d2 = head_d + 2 * eps);
            }
    }
}
